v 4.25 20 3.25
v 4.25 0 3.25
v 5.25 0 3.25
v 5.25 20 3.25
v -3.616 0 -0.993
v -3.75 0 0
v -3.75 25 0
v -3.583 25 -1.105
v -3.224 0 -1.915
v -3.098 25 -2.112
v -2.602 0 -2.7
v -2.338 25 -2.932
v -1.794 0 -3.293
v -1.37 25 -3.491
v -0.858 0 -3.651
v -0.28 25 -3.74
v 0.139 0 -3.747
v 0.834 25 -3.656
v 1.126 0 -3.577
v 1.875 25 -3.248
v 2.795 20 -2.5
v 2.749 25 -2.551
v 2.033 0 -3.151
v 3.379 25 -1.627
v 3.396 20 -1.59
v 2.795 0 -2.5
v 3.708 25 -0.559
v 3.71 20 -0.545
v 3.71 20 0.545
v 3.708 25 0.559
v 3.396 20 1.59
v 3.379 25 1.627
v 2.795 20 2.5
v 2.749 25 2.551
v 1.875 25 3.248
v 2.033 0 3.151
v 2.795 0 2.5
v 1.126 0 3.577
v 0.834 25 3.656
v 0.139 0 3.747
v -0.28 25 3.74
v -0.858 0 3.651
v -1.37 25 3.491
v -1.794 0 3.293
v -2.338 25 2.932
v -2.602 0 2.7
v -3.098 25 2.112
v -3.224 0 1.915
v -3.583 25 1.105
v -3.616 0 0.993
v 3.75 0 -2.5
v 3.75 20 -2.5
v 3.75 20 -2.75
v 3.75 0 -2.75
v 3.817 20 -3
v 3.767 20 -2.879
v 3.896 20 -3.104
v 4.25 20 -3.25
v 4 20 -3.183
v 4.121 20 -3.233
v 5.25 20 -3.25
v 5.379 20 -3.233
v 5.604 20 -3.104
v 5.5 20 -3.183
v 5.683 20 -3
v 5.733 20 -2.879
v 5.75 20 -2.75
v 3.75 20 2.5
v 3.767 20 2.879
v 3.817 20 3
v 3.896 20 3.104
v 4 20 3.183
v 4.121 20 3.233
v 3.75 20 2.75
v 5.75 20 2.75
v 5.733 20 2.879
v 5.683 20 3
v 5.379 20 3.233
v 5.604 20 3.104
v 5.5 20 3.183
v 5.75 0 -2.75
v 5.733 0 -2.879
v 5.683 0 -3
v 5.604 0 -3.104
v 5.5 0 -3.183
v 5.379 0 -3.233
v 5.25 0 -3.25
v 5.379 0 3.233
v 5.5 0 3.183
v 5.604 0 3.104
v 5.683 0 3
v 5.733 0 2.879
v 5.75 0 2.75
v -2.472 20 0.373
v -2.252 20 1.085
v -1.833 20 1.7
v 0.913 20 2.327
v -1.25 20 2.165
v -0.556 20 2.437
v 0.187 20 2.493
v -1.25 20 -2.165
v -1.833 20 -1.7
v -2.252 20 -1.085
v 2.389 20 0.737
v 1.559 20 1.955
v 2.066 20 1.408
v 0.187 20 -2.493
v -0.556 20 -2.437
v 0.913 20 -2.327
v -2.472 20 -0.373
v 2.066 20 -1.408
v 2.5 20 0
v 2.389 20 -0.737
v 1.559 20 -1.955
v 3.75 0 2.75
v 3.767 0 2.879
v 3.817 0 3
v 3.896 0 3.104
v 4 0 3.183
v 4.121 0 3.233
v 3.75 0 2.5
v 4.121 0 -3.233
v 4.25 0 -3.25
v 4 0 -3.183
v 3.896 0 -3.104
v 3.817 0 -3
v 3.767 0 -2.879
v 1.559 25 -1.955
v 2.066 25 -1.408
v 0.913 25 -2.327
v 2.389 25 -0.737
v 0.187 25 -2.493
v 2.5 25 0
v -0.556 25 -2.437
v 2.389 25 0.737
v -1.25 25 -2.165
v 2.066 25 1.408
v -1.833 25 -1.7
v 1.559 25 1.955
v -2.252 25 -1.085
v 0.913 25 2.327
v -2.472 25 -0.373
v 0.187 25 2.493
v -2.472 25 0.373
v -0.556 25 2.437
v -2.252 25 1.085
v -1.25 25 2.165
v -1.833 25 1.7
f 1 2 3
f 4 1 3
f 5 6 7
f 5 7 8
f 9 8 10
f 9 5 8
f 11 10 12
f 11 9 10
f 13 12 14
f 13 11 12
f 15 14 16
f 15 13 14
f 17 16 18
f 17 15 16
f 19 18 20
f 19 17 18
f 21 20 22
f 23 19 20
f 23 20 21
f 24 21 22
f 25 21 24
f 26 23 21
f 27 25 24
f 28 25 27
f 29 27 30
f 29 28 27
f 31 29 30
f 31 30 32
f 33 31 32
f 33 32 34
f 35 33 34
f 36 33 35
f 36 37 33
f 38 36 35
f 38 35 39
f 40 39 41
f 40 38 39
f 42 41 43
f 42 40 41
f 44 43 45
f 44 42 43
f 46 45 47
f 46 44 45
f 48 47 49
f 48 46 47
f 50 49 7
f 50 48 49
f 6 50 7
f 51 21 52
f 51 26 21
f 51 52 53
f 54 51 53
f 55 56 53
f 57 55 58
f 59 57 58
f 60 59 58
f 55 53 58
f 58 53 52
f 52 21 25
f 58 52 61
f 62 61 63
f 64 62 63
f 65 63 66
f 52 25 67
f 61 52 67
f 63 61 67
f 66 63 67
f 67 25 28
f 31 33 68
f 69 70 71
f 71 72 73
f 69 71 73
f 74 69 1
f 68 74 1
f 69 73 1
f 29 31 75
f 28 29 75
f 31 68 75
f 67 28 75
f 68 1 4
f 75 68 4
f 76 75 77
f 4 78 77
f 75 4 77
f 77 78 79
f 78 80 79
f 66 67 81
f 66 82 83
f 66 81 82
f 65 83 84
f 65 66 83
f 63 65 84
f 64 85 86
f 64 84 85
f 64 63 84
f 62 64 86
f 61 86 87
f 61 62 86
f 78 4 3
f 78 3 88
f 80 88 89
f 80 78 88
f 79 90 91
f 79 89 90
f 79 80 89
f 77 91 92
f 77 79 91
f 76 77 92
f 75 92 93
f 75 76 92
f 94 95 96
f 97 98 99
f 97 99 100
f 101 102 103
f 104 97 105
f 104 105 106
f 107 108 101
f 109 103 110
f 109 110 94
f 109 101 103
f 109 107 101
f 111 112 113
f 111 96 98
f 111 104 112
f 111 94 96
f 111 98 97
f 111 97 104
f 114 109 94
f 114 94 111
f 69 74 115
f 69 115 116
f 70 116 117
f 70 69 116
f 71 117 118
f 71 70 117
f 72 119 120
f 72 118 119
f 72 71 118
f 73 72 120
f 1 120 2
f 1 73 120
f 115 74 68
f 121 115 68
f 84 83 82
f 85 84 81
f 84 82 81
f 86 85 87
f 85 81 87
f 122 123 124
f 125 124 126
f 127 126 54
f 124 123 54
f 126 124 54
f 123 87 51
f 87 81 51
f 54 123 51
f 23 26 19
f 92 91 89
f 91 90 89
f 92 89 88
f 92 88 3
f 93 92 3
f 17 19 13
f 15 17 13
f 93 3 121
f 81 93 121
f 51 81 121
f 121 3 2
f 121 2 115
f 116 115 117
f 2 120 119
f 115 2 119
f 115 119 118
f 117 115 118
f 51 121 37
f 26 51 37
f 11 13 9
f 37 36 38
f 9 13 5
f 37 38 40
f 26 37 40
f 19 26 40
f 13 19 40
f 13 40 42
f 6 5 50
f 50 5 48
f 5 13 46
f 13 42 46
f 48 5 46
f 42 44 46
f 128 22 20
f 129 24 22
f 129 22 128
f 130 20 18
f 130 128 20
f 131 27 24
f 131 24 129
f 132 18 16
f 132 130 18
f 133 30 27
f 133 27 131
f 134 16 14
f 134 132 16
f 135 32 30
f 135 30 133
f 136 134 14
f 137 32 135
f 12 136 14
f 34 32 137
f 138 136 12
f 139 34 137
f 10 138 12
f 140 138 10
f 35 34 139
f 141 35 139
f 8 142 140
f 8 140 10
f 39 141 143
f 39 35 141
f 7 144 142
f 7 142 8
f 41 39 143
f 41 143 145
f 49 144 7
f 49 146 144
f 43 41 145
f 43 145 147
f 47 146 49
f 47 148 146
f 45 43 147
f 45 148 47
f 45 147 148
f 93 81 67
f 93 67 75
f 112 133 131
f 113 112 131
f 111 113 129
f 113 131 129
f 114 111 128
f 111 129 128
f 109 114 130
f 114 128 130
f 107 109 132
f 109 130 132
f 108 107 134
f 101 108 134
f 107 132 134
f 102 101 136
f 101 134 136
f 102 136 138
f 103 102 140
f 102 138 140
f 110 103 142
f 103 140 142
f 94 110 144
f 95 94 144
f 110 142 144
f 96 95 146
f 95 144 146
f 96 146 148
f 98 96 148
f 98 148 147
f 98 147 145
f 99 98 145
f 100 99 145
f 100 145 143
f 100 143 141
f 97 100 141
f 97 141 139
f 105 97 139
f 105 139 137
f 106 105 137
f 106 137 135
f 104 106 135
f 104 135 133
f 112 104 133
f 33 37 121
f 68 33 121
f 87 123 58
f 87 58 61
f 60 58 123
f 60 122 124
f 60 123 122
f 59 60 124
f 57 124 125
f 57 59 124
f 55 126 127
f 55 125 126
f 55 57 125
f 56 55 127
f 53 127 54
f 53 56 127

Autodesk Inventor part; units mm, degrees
ref_plane "YZ Plane" through (0, 0, 0) normal (1, 0, 0) x (0, 1, 0)
ref_plane "XZ Plane" through (0, 0, 0) normal (0, 1, 0) x (-1, 0, 0)
ref_plane "XY Plane" through (0, 0, 0) normal (0, 0, 1) x (1, 0, 0)
sketch "スケッチ1" plane through (0, 0, 0) normal (0, 0, 1) x (1, 0, 0)
  line L0 (0, 25) -> (-3.75, 25)
  line L1 (-3.75, 25) -> (-3.75, 0)
  line L2 (-3.75, 0) -> (0, 0)
  line L3 (0, 0) -> (0, 25)
  line L4 (0, -5) -> (0, 30) projected
  line L5 (-4.5, 0) -> (0.75, 0) projected
  dimension "d2" = 3.75
  dimension "d3" = 25
revolve "回転1" add sketch "スケッチ1" angle 360 about axis through (0, -10, 0) along (0, 1, 0)
sketch "スケッチ3" plane through (0, 25, 0) normal (0, 1, 0) x (1, 0, 0)
  circle A0 centre (0, 0) radius 2.5
  dimension "d5" = 5
extrude "押し出し1" cut sketch "スケッチ3" against normal blind 5
sketch "スケッチ4" plane through (0, 0, 0) normal (0, -1, 0) x (1, 0, 0)
  circle A0 centre (0, 0) radius 3.75 projected
  line L0 (3.75, 3.25) -> (5.75, 3.25)
  line L1 (3.75, -3.25) -> (5.75, -3.25)
  line L2 (5.75, -3.25) -> (5.75, 3.25)
  line L3 (2.7951, 2.5) -> (3.75, 2.5)
  line L4 (-5.65, 0) -> (7.65, 0) projected
  line L5 (3.75, 3.25) -> (3.75, 2.5)
  line L6 (3.75, 0) -> (3.75, -3.25)
  line L7 (2.7951, -2.5) -> (3.75, -2.5)
  dimension "d9" = 6.5
  dimension "d10" = 2
  dimension "d11" = 2.5
  dimension "d12" = 5
extrude "押し出し2" add sketch "スケッチ4" against normal blind 20 contours L6 L7 A0 | A0 L3 L5 L0 L2 L4 | L4 L2 L1 L6
fillet "フィレット1" radius 0.5 4 edges at (5.75, 10, 3.25) (5.75, 10, -3.25) (3.75, 10, 3.25) (3.75, 10, -3.25)
properties part number "flat_cover_5mm"
